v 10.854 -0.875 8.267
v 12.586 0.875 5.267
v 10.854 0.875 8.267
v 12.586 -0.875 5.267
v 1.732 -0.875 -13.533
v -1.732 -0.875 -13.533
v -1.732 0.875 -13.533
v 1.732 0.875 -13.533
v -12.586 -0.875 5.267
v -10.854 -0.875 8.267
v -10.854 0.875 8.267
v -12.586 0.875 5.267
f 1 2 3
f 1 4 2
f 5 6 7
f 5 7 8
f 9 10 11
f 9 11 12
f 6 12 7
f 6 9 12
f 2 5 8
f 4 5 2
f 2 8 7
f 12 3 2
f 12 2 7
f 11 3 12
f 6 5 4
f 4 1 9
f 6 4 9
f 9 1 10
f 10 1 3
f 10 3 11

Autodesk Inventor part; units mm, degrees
ref_plane "YZ Plane" through (0, 0, 0) normal (1, 0, 0) x (0, 1, 0)
ref_plane "XZ Plane" through (0, 0, 0) normal (0, 1, 0) x (-1, 0, 0)
ref_plane "XY Plane" through (0, 0, 0) normal (0, 0, 1) x (1, 0, 0)
sketch "Sketch1" plane through (0, 0, 0) normal (0, 1, 0) x (-1, 0, 0)
  line L0 (1.7321, -13.5333) -> (-1.7321, -13.5333)
  line L1 (-1.7321, -13.5333) -> (-12.5862, 5.2667)
  line L2 (-12.5862, 5.2667) -> (-10.8542, 8.2667)
  line L3 (-10.8542, 8.2667) -> (10.8542, 8.2667)
  line L4 (10.8542, 8.2667) -> (12.5862, 5.2667)
  line L5 (12.5862, 5.2667) -> (1.7321, -13.5333)
  circle A0 centre (0, 0) radius 8.2667 construction
  point P0 (0, -16.5333)
  dimension "d0" = 21.8
  dimension "d1" = 3.4641
  dimension "d4" = 24.8
extrude "Extrusion1" add sketch "Sketch1" along normal mid plane 1.75
equation "\"d0\" = TriangleTrimmed"
equation "\"d4\" = TriangleHeight"
equation "\"TriangleTrimmed\" = 21.8"
equation "\"TriangleHeight\" = 24.8"
properties part number "CommandToken_Single" material "Paper"
